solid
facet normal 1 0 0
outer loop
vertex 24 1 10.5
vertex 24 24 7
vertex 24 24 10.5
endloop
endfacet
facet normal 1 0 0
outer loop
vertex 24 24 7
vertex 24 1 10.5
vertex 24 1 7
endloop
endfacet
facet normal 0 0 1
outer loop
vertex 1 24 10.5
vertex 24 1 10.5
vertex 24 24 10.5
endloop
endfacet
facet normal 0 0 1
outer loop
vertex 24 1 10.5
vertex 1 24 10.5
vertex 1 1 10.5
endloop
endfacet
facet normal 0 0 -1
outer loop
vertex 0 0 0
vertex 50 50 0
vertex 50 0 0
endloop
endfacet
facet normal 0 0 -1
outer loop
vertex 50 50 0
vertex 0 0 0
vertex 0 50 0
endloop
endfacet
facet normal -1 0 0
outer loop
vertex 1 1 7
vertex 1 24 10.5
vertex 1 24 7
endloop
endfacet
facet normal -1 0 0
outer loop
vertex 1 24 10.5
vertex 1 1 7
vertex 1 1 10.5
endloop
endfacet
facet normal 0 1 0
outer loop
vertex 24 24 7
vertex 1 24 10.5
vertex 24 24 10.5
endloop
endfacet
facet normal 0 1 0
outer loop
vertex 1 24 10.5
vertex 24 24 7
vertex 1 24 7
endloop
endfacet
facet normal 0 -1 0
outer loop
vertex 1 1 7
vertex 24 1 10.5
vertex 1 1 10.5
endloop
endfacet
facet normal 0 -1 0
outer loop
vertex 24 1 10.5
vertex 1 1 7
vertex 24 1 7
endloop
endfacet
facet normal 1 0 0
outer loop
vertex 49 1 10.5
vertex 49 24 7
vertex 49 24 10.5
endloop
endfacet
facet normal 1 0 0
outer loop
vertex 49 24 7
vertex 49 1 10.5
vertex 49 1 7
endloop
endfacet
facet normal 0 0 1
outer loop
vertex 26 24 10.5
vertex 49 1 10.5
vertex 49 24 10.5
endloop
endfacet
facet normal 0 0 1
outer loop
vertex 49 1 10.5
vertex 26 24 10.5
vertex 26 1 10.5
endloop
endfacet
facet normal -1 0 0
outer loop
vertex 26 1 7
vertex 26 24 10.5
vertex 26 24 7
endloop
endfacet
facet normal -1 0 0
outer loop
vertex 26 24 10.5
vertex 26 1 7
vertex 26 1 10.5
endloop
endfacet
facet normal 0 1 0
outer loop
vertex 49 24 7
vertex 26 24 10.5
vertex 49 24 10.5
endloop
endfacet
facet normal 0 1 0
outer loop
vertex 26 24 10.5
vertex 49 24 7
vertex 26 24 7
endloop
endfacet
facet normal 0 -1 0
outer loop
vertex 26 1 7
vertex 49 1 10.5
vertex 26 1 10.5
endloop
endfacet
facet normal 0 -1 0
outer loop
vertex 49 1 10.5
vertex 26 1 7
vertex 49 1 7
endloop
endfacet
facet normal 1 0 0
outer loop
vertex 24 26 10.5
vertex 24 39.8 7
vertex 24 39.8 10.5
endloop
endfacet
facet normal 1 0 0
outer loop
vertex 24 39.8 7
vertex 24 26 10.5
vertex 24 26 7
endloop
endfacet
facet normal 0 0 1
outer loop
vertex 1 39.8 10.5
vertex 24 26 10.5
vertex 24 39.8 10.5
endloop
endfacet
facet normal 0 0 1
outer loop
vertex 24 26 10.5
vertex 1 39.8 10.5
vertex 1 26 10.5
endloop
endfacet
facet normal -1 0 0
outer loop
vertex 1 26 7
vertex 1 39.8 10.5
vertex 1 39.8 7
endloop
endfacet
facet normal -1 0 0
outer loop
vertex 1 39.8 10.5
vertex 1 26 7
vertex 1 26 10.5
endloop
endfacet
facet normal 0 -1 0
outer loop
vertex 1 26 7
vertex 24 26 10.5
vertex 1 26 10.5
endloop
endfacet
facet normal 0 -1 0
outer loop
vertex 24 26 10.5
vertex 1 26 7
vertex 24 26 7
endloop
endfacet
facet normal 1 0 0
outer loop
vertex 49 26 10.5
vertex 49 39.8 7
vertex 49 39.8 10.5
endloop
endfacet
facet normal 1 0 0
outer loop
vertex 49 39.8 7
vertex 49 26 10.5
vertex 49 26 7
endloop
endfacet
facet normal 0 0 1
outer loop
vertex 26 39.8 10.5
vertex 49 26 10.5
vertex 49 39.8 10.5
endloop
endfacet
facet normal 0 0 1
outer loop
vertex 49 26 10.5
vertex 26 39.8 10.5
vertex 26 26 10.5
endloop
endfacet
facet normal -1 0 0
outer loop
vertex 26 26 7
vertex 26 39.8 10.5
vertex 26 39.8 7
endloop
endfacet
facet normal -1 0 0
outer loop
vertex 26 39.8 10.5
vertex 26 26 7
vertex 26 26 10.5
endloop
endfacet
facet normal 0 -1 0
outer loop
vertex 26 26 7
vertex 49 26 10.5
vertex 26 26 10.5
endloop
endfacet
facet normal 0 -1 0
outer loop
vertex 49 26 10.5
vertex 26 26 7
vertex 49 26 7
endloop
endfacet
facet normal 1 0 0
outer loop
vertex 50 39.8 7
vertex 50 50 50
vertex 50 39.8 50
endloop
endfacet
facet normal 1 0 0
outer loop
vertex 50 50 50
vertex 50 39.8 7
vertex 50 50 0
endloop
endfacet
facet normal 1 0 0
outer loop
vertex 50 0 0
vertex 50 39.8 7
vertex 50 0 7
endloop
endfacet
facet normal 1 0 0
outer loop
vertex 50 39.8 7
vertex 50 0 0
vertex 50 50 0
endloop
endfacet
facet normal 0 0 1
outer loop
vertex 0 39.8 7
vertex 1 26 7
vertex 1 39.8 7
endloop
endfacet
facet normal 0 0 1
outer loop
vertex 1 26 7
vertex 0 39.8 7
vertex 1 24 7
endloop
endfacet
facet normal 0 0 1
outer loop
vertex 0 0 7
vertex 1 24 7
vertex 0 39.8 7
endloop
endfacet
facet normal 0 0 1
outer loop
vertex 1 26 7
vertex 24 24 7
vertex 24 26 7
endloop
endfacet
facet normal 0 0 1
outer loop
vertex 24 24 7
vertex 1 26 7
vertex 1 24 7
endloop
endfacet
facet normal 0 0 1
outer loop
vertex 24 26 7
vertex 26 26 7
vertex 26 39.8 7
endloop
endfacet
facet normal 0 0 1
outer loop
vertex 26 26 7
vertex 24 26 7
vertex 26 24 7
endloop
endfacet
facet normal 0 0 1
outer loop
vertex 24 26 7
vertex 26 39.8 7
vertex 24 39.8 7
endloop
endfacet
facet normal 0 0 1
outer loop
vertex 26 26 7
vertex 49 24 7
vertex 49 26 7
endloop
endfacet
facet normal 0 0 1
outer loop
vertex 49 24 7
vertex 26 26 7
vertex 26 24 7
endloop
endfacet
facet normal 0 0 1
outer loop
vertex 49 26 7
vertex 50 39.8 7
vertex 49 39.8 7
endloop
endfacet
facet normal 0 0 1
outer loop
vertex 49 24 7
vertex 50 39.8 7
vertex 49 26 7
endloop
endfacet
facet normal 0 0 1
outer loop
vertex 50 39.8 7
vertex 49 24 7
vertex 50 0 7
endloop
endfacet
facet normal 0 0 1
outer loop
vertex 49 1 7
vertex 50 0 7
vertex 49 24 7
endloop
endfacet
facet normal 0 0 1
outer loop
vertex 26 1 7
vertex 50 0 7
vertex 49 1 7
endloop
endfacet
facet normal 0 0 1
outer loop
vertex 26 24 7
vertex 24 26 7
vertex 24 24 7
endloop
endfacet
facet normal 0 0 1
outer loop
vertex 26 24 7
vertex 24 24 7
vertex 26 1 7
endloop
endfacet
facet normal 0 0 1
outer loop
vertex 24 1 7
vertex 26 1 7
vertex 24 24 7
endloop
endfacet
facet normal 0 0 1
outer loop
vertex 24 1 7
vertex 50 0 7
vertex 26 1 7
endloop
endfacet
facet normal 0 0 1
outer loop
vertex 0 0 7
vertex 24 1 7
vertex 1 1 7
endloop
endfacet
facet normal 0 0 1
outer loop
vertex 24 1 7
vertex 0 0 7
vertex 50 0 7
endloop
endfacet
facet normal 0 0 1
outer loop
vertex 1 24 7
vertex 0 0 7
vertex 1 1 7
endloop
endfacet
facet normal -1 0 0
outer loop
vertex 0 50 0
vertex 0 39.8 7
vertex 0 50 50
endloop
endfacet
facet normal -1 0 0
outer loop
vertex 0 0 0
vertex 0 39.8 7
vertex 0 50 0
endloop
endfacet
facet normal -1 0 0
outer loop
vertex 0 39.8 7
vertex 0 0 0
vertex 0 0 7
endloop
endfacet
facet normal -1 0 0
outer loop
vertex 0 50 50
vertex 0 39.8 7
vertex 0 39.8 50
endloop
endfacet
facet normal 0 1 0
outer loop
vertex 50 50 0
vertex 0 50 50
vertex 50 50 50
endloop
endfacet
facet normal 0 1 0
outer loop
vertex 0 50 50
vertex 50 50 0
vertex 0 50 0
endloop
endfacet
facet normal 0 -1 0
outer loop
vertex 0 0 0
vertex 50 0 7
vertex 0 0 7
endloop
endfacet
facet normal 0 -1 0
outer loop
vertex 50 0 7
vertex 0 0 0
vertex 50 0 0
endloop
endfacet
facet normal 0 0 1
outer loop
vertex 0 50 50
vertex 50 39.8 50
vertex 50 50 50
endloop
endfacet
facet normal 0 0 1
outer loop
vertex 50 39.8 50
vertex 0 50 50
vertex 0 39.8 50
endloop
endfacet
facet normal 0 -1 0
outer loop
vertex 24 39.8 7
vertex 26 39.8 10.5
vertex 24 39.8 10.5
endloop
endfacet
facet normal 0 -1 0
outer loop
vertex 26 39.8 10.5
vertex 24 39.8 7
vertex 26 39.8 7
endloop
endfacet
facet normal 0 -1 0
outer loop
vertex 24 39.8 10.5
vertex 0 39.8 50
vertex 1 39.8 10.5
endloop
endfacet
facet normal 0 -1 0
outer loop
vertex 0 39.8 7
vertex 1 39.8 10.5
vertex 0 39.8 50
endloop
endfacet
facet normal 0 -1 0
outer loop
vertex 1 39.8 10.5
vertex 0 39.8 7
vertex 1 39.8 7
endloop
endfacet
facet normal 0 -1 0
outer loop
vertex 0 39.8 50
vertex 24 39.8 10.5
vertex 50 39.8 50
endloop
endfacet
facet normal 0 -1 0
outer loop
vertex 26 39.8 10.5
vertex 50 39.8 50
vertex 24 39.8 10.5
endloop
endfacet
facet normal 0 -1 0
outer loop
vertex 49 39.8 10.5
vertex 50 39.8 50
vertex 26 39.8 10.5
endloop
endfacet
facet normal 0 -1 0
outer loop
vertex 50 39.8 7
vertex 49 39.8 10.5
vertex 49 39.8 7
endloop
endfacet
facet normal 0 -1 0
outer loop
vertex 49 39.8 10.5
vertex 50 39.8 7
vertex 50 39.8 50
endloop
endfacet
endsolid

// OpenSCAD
color("LightGray") {
    translate([1,1,0]) cube([23,23,6+4.5]);
    translate([25+1,1,0]) cube([23,23,6+4.5]);
    translate([1,25+1,0]) cube([23,23,6+4.5]);
    translate([25+1,25+1,0]) cube([23,23,6+4.5]);
}
color("Grey") {
    cube([50,50,7]);
    translate([0,50-10.2,0]) cube([50,10.2,50]);
}
